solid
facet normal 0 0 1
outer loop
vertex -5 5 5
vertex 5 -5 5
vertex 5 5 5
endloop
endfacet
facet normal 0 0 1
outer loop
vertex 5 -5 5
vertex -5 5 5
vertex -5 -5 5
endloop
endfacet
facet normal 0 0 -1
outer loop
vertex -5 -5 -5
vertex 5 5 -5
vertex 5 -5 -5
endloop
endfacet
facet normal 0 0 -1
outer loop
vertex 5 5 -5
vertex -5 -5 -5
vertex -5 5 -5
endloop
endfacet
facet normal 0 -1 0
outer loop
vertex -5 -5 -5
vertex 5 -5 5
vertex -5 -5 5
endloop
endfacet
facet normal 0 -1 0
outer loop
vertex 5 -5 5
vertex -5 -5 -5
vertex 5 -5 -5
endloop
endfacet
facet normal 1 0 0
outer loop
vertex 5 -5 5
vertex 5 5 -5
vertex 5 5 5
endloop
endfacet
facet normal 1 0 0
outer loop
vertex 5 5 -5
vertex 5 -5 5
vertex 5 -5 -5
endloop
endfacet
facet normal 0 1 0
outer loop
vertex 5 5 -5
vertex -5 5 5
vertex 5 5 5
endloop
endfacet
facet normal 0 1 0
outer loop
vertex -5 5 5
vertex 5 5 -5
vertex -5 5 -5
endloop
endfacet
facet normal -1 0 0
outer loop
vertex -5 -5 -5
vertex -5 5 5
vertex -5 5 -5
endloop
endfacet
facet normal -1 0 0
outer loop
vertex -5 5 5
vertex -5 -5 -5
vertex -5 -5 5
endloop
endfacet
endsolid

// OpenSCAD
W = 10;
D = 10;
H = 10;

module part(w, d, h) {
    cube([w, d, h], center = true);
}

part(W, D, H);
